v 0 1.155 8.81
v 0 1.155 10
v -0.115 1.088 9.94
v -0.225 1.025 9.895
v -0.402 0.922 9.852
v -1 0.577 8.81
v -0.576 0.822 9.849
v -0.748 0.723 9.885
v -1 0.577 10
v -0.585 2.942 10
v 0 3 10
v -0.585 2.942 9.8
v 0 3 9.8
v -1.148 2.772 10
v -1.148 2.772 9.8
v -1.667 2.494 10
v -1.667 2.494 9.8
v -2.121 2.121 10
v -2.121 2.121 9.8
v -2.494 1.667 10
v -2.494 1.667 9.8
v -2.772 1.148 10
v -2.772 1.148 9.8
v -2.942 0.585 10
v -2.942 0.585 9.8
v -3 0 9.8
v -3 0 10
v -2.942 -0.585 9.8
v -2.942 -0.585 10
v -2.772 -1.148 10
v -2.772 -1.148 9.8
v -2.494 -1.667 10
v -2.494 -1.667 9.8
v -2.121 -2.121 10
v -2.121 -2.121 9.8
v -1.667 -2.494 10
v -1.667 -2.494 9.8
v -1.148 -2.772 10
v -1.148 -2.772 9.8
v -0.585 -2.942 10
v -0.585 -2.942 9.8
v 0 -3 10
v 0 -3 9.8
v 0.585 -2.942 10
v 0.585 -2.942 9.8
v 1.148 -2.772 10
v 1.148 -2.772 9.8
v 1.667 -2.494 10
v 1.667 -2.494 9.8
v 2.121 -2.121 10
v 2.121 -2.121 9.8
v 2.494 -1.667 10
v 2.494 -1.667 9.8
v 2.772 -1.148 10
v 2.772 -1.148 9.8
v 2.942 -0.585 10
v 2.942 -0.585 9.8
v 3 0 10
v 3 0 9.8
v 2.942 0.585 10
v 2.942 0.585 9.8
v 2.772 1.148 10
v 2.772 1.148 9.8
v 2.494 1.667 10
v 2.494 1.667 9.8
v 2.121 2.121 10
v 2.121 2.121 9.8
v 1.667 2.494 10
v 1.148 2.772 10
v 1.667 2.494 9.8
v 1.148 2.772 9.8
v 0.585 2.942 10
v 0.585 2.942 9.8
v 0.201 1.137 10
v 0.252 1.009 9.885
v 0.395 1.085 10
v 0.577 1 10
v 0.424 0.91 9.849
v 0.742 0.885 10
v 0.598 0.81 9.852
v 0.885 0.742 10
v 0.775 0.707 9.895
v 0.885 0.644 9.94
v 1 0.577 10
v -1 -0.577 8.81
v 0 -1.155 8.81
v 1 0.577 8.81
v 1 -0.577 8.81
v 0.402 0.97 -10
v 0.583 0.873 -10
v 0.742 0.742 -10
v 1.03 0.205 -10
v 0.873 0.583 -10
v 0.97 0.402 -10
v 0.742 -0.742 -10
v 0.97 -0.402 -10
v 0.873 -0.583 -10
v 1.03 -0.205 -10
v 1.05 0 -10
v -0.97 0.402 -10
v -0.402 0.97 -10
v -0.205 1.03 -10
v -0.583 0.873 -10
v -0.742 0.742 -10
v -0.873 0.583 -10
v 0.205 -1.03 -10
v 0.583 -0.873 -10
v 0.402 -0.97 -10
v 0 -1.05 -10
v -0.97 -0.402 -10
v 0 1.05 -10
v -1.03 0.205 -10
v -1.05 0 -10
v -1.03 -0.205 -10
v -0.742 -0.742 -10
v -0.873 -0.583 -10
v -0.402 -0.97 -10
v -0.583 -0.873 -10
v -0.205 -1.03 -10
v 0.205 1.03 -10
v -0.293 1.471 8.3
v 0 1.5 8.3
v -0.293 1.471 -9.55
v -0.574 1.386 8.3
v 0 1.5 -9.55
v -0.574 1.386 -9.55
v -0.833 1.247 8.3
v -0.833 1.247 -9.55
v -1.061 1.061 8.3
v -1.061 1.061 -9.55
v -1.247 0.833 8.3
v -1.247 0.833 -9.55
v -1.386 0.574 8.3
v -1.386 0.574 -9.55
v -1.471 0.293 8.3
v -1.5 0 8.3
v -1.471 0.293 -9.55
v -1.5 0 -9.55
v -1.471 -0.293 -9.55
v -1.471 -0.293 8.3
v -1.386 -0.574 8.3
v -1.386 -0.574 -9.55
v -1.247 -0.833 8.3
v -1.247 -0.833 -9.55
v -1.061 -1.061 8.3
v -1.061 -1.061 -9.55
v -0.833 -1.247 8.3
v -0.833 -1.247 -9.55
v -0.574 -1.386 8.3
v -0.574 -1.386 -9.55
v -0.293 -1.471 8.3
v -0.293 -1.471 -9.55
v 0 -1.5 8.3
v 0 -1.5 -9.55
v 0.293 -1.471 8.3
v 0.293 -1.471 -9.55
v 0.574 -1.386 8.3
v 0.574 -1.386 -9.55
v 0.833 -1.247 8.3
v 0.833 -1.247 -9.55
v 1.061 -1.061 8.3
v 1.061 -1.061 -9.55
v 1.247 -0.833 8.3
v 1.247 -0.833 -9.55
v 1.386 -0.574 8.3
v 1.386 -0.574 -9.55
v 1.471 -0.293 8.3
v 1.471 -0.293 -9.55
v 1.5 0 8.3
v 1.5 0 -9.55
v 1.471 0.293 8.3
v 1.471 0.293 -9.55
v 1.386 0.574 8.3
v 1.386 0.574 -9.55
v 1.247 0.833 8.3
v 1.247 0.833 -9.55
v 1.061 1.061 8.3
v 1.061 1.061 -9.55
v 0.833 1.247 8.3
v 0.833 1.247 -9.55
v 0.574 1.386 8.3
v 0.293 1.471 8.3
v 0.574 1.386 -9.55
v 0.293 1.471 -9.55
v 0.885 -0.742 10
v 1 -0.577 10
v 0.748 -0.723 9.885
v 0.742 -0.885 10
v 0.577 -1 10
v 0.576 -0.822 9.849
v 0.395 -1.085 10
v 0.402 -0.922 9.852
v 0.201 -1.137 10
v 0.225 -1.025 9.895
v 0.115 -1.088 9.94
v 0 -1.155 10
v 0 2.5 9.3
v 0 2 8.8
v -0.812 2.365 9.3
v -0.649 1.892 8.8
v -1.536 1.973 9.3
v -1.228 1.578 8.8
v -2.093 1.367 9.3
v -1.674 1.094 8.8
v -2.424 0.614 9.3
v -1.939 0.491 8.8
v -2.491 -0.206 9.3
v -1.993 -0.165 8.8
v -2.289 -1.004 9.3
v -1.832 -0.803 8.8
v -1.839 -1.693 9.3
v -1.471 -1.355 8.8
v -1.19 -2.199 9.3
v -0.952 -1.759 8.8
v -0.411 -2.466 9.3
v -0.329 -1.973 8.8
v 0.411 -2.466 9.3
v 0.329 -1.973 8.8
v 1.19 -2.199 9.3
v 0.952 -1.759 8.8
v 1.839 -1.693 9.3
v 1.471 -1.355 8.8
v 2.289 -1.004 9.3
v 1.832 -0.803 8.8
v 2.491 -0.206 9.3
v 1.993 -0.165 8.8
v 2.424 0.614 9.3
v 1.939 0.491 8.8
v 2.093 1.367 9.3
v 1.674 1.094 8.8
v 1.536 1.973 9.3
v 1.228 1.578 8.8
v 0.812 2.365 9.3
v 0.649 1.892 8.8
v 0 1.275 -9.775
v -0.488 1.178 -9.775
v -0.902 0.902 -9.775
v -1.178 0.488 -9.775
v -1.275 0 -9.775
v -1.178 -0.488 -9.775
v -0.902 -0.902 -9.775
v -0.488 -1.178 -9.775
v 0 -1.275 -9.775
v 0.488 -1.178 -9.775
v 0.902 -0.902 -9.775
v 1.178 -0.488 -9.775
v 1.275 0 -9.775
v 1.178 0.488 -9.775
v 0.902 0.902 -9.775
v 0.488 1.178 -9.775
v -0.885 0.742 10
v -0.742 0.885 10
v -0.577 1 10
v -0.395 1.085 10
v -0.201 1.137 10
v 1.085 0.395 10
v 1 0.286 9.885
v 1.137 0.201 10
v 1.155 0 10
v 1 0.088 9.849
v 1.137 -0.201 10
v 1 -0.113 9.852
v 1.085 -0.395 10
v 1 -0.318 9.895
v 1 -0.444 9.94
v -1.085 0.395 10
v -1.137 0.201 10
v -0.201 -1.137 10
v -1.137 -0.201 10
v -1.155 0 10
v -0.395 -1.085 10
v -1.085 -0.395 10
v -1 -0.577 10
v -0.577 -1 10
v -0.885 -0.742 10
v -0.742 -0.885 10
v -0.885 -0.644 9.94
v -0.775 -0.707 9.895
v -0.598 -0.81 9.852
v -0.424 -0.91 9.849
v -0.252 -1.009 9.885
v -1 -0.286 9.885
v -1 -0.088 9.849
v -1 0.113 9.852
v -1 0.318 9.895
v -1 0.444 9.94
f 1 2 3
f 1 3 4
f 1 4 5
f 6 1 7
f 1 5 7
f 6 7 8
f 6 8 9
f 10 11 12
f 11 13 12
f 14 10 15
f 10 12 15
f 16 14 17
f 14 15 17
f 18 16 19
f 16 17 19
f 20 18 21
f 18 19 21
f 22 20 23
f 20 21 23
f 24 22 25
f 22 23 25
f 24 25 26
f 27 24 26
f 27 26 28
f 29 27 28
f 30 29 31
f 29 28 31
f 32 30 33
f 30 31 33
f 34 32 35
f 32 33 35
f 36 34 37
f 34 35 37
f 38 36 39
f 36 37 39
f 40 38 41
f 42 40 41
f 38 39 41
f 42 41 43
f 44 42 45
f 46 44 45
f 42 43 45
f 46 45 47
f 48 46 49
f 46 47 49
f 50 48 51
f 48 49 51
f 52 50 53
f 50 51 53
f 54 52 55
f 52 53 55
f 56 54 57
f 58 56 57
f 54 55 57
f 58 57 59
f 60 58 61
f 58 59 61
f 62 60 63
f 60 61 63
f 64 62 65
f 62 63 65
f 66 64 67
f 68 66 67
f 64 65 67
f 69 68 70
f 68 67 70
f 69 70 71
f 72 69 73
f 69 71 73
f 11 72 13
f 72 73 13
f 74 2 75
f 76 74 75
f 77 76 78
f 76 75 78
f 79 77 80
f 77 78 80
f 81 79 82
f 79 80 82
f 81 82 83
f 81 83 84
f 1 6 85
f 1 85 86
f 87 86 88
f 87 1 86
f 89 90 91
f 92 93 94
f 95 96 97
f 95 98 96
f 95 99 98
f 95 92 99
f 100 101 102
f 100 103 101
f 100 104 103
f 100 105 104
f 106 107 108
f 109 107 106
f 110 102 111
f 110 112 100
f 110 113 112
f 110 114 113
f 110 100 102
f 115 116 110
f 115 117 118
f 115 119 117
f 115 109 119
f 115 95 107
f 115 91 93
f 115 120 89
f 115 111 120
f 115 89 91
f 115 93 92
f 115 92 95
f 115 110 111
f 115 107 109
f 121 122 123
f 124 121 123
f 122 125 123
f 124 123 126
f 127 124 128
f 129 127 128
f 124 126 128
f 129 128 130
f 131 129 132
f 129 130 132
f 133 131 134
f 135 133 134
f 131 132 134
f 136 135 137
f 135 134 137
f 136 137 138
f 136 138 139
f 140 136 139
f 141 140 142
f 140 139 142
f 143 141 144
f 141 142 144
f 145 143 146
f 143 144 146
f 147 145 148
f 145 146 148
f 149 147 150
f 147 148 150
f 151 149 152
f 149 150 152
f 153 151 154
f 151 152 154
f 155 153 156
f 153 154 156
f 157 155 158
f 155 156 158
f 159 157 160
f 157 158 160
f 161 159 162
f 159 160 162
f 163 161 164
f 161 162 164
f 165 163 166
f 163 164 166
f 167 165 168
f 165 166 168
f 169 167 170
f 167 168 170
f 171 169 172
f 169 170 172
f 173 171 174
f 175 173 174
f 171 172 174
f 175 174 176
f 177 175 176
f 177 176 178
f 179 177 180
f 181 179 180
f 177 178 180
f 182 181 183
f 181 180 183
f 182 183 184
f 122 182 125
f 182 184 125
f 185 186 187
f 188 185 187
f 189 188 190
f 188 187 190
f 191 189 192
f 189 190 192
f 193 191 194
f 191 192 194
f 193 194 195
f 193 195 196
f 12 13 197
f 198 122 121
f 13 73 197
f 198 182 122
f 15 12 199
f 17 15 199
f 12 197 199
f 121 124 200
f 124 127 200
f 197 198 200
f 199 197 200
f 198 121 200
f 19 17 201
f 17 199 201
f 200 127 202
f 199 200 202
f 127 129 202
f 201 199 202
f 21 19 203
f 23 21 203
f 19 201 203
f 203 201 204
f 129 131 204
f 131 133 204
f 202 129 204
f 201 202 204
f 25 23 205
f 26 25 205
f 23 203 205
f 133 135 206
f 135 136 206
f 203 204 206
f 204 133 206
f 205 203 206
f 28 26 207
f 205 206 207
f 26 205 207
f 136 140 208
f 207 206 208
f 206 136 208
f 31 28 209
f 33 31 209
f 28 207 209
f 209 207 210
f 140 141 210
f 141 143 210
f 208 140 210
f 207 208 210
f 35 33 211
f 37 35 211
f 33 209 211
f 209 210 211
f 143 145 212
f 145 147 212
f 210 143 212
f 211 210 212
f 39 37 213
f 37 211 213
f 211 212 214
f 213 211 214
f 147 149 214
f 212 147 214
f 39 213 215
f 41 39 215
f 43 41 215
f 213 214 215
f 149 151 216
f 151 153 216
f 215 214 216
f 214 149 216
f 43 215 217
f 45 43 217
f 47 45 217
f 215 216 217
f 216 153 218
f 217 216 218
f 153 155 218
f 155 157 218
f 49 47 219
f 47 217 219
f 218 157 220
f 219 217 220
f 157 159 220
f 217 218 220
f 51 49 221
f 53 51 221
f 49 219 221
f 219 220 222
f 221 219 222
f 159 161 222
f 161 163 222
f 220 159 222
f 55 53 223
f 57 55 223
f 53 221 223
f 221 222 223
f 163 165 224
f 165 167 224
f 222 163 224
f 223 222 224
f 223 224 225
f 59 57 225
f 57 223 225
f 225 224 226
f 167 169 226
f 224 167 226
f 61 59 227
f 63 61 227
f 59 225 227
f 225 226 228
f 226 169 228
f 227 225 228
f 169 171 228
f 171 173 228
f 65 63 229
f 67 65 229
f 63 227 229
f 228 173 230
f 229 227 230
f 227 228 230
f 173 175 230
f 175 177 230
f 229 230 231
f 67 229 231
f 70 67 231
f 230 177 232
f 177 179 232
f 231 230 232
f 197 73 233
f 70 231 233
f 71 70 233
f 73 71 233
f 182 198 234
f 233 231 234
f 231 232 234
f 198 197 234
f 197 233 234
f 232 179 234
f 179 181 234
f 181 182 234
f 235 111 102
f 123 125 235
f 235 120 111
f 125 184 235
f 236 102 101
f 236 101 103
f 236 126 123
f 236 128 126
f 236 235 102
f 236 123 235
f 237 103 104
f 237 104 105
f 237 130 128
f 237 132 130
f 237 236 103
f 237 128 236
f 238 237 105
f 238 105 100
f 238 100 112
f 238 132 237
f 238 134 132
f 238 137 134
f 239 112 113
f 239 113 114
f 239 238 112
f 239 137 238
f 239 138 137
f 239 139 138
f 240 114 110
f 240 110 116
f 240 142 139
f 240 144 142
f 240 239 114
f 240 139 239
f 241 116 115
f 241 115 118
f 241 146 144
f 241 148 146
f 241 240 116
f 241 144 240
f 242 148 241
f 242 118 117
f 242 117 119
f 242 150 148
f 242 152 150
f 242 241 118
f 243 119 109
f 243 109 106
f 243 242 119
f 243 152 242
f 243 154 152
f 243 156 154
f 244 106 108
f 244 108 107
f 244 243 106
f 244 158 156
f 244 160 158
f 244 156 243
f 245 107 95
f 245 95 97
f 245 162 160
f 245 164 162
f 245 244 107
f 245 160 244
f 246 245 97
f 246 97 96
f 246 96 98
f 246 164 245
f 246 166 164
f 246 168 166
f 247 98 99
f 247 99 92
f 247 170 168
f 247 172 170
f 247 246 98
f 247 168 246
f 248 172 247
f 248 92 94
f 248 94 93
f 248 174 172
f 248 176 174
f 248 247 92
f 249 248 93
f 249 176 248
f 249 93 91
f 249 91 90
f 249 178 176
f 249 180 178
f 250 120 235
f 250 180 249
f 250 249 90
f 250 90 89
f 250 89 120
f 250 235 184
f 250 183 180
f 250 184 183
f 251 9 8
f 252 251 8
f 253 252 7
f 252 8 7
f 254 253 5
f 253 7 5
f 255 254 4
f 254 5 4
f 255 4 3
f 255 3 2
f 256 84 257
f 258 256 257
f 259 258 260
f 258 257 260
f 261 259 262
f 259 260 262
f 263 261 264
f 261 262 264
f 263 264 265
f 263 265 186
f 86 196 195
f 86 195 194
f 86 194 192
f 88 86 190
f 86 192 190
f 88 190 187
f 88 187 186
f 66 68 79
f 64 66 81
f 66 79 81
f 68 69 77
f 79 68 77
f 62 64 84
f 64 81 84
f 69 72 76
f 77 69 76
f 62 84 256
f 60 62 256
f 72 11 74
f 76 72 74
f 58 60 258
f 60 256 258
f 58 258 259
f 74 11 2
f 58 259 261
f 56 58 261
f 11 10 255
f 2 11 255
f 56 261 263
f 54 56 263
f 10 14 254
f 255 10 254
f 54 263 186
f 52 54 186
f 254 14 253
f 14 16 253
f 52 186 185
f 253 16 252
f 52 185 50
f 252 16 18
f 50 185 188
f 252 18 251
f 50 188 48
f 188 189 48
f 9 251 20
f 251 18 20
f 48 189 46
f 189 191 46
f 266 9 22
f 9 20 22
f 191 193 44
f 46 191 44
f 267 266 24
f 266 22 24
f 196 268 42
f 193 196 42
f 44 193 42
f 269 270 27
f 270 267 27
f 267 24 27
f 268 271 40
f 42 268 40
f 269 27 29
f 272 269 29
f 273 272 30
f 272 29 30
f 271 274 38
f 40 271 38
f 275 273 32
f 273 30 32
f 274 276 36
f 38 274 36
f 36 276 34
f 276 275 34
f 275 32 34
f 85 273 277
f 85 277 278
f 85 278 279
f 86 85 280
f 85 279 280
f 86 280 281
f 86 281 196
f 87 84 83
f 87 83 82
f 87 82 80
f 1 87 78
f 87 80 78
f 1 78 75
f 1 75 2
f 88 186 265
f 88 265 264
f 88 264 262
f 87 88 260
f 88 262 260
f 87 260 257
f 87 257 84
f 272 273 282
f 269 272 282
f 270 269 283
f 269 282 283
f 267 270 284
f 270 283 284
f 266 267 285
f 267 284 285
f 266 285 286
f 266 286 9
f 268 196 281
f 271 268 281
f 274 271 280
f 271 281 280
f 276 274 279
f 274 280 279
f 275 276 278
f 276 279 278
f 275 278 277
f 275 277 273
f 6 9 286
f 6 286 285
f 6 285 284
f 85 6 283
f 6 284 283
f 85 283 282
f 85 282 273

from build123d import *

# Parameters (mm, degrees)
SKETCH3_W          = 20
SKETCH3_H          = 1.5
CHAMFER1_SIZE      = 0.45
CUT_EXTRUDE1_DEPTH = 1.19


with BuildPart() as part:
    # Sketch3 → Revolve1 (revolve)
    with BuildSketch(Plane(origin=(0, 0, 0), x_dir=(0, 0, -1), z_dir=(1, 0, 0))):
        with Locations((0, 0.75)):
            Rectangle(SKETCH3_W, SKETCH3_H)
    revolve(axis=Axis((0, 0, -10), (0, 0, 1)))

    # Chamfer1
    chamfer1_edges = [part.edges().sort_by_distance(p)[0] for p in [
        (0, -1.5, -10),
    ]]
    chamfer(chamfer1_edges, length=CHAMFER1_SIZE)

    # Sketch6 → Revolve2 (revolve)
    with BuildSketch(Plane(origin=(0, 0, 0), x_dir=(0, 0, -1), z_dir=(1, 0, 0))):
        Polygon((-10, 3), (-9.8, 3), (-8.3, 1.5), (-8.3, 0), (-10, 0), align=None)
    revolve(axis=Axis((0, 0, -10), (0, 0, 1)))

    # Sketch8 → Cut-Extrude1 (cut)
    with BuildSketch(Plane.XY.offset(10)):
        Polygon((0, 1.154700538), (-1, 0.577350269), (-1, -0.577350269), (0, -1.154700538), (1, -0.577350269), (1, 0.577350269), align=None)
    extrude(amount=-CUT_EXTRUDE1_DEPTH, mode=Mode.SUBTRACT)

    # Cut-Extrude2 cone 1 section (through the dimple's axis) → Cut-Extrude2 (revolve, cut)
    with BuildSketch(Plane(origin=(0, 0, 10), x_dir=(0, -1, 0), z_dir=(1, 0, 0))):
        Polygon((0, 0), (1.154700538, 0), (0, 1.154700538), align=None)
    revolve(axis=Axis((0, 0, 10), (0, 0, -1)), mode=Mode.SUBTRACT)


solid = part.part
